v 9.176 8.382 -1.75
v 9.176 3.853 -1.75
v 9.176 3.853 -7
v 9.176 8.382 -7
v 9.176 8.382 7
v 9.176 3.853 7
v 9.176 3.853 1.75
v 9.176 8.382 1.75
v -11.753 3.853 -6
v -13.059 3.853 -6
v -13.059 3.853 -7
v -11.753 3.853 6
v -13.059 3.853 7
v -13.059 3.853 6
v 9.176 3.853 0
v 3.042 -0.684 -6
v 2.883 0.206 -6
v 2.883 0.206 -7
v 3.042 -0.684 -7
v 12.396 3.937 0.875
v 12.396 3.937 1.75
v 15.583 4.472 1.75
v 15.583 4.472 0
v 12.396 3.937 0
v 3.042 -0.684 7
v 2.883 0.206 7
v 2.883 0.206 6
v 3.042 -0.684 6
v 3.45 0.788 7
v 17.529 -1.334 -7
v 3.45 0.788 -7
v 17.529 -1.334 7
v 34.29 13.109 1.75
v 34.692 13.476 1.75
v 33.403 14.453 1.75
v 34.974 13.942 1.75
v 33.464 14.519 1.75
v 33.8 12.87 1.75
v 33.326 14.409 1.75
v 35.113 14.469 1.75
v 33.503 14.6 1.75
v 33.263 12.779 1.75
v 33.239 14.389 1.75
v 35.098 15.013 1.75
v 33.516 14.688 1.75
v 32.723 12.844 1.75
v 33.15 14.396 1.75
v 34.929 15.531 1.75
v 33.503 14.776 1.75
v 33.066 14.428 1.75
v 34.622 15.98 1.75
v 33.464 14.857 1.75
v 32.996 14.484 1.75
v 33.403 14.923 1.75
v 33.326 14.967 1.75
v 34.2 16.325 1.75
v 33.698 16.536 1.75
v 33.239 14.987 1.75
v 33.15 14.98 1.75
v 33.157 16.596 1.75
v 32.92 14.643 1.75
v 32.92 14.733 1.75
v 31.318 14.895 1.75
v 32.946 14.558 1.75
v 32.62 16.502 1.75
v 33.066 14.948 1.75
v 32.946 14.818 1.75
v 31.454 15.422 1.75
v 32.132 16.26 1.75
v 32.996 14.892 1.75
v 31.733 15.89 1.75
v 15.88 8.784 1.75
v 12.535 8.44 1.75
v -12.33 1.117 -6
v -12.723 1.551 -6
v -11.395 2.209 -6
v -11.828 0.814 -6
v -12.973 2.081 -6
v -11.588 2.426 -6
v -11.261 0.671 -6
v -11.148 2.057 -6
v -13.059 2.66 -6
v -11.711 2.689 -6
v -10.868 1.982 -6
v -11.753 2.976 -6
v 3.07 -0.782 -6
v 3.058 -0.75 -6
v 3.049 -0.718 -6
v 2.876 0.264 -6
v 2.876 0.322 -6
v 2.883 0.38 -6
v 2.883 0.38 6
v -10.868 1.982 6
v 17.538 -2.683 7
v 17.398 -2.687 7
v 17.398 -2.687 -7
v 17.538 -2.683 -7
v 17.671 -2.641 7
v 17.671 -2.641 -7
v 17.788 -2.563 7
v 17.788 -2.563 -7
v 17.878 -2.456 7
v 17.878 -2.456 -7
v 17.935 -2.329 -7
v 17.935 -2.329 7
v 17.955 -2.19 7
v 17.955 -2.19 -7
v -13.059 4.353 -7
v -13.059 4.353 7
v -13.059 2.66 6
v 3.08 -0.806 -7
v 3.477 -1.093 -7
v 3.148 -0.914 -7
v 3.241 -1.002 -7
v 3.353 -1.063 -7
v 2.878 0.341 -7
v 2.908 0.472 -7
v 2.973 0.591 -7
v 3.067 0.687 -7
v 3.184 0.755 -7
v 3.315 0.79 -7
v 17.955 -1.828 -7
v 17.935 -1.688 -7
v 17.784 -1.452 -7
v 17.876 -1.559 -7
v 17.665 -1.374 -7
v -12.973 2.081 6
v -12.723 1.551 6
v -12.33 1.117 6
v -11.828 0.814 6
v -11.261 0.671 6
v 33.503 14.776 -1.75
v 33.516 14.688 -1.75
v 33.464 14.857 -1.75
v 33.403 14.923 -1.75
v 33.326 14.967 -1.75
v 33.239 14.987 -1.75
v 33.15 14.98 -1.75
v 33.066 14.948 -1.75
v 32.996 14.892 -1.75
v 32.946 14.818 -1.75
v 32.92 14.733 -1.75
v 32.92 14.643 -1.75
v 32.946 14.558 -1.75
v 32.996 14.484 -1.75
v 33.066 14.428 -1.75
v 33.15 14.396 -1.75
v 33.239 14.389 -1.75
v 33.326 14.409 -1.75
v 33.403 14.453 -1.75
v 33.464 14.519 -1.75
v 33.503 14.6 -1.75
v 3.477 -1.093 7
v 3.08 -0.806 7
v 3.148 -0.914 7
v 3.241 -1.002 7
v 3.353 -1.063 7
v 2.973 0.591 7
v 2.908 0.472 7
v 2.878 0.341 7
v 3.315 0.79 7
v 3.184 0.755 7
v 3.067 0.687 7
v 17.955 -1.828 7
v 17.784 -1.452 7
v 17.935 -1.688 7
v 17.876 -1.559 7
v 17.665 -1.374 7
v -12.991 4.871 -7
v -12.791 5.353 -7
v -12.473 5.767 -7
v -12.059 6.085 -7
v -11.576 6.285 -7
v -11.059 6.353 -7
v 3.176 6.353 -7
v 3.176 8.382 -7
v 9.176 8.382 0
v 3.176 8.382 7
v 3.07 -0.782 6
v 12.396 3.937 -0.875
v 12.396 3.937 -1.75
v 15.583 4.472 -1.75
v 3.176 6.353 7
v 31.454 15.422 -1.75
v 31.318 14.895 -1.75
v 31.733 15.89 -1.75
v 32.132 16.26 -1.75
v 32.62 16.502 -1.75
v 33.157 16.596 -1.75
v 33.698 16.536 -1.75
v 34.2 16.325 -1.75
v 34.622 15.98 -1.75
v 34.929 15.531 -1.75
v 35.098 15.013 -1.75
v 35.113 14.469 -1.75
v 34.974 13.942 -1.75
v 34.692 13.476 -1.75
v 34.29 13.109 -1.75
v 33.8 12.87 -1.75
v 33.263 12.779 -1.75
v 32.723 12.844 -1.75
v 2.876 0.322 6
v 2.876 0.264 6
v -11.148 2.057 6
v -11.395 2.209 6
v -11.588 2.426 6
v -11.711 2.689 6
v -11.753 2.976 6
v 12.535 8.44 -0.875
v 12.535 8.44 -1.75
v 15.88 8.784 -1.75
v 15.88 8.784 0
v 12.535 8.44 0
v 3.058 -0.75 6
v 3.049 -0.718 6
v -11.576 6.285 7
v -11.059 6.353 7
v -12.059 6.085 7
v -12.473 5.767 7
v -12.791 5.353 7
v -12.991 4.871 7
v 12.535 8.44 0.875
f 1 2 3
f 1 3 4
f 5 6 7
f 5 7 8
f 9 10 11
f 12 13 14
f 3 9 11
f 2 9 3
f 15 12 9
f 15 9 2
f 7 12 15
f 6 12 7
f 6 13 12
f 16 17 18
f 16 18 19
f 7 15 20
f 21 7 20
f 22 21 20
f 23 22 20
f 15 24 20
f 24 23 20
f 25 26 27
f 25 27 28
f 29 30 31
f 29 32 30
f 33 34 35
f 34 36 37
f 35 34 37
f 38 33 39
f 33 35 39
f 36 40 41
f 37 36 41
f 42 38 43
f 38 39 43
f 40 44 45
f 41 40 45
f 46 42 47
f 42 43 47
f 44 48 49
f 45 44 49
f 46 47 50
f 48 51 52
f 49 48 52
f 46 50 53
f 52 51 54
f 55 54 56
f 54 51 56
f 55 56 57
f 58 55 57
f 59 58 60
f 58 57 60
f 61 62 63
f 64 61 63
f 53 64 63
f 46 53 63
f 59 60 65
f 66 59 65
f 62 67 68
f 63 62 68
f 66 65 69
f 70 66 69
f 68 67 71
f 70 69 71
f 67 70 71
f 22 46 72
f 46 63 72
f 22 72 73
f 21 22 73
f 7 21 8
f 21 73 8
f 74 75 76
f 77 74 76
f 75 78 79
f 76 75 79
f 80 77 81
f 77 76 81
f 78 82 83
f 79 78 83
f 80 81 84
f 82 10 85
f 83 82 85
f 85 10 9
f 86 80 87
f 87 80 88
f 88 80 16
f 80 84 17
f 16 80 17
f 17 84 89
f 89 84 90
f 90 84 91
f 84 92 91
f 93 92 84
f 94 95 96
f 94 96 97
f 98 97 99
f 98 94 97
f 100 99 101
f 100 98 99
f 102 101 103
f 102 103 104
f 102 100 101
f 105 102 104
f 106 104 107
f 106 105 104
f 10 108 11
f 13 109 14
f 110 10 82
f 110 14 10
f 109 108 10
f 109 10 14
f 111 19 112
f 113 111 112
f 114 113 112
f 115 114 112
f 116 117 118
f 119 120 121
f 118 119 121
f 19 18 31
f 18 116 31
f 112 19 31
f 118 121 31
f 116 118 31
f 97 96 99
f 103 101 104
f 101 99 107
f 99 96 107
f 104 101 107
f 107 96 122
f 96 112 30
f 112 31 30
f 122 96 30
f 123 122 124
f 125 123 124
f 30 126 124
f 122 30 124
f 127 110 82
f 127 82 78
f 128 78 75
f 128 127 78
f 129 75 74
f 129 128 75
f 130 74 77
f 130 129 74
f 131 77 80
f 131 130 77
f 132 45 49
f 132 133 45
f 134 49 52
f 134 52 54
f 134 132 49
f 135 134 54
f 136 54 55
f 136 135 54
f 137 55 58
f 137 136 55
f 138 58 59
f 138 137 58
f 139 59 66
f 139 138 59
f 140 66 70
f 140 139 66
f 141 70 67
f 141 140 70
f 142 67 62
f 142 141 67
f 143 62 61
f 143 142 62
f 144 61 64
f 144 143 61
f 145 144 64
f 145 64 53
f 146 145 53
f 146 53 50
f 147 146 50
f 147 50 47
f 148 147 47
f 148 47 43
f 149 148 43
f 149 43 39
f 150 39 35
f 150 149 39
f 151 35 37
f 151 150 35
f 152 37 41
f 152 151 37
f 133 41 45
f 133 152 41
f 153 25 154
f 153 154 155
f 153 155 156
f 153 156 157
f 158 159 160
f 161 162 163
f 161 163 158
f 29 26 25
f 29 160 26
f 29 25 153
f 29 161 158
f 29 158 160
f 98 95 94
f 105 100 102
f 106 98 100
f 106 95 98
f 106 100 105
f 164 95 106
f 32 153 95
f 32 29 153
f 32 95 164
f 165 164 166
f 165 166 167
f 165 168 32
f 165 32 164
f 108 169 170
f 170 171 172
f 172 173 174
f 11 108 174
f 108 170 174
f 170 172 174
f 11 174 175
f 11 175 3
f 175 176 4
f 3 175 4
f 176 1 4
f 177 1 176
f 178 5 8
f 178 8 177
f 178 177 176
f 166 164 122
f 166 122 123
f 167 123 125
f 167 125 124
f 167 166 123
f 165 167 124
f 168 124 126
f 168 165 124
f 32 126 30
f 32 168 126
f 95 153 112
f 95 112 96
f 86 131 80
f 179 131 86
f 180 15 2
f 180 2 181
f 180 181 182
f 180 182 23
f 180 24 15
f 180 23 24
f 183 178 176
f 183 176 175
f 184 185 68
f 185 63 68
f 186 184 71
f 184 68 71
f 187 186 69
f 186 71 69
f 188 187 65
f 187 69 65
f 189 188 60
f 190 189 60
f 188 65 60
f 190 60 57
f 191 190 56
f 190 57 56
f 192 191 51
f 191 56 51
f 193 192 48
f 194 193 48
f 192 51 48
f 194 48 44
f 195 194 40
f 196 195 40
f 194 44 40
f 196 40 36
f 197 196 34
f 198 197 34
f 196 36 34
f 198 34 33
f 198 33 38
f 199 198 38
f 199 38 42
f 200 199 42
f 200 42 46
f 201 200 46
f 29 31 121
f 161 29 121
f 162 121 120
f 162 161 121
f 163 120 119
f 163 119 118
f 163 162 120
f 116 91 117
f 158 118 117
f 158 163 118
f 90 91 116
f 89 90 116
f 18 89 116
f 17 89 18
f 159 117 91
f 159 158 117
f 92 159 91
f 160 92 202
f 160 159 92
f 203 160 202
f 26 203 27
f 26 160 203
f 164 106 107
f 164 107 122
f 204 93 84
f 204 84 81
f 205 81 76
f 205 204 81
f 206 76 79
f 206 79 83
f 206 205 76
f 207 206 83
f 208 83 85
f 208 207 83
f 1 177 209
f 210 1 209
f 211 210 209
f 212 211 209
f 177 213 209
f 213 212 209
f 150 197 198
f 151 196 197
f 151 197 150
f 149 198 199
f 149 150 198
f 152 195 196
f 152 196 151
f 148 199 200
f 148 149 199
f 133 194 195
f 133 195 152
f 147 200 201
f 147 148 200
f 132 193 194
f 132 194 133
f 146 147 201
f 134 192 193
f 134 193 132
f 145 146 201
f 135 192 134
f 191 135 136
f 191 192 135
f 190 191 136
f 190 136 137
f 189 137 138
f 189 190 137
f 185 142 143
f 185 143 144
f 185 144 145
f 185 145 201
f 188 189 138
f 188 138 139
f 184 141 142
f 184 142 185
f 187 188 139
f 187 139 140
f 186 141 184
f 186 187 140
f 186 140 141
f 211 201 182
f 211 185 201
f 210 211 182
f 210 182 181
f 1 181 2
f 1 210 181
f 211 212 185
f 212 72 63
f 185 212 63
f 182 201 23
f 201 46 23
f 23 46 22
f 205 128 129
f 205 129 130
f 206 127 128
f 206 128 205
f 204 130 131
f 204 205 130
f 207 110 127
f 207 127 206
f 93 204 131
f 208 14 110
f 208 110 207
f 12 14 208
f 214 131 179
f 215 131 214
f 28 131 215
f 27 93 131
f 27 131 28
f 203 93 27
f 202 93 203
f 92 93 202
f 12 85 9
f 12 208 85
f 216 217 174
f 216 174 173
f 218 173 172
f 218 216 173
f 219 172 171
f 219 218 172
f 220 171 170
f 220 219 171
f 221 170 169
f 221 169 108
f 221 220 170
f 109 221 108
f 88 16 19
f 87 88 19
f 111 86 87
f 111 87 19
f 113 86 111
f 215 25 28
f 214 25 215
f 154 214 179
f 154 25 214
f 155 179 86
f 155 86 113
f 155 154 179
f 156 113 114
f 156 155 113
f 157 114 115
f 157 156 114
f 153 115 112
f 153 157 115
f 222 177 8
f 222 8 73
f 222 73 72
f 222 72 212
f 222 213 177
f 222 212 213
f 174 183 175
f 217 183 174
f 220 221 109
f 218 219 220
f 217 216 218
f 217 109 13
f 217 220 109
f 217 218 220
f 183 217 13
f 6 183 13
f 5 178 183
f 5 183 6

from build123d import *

# Parameters (mm, degrees)
BOSS_EXTRUDE1_DEPTH = 7
BOSS_EXTRUDE2_DEPTH = 6
BOSS_EXTRUDE3_DEPTH = 7
SKETCH4_R           = 0.3
BOSS_EXTRUDE4_DEPTH = 1.75


with BuildPart() as part:
    # Sketch1 → Boss-Extrude1 (new, symmetric)
    with BuildSketch(Plane.XY):
        with BuildLine():
            Line((9.176470588, 3.852941176), (9.176470588, 8.382352941))
            Line((9.176470588, 8.382352941), (3.176470588, 8.382352941))
            Line((3.176470588, 8.382352941), (3.176470588, 6.352941176))
            Line((3.176470588, 6.352941176), (-11.058823529, 6.352941176))
            ThreePointArc((-11.058823529, 6.352941176), (-12.473037092, 5.767154739), (-13.058823529, 4.352941176))
            Line((-13.058823529, 4.352941176), (-13.058823529, 3.852941176))
            Line((-13.058823529, 3.852941176), (9.176470588, 3.852941176))
        make_face()
    extrude(amount=BOSS_EXTRUDE1_DEPTH, both=True)

    # Sketch2 → Boss-Extrude2 (add, symmetric)
    with BuildSketch(Plane.XY):
        with BuildLine():
            Line((-13.058823529, 3.852941176), (-13.058823529, 2.660454677))
            ThreePointArc((-13.058823529, 2.660454677), (-12.542636873, 1.319448352), (-11.260525567, 0.670651599))
            Line((-11.260525567, 0.670651599), (3.072810241, -0.782287673))
            Line((3.072810241, -0.782287673), (3.072810241, 0.357643739))
            Line((3.072810241, 0.357643739), (-10.868321542, 1.982265031))
            ThreePointArc((-10.868321542, 1.982265031), (-11.499481128, 2.310618881), (-11.752570466, 2.975543285))
            Line((-11.752570466, 2.975543285), (-11.752570466, 3.852941176))
            Line((-11.752570466, 3.852941176), (-13.058823529, 3.852941176))
        make_face()
    extrude(amount=BOSS_EXTRUDE2_DEPTH, both=True)

    # Sketch3 → Boss-Extrude3 (add, symmetric)
    with BuildSketch(Plane.XY):
        with BuildLine():
            Line((2.883131421, 0.205607724), (3.042051607, -0.684345316))
            ThreePointArc((3.042051607, -0.684345316), (3.191971306, -0.960915025), (3.477393899, -1.0932051))
            Line((3.477393899, -1.0932051), (17.397932492, -2.686911621))
            ThreePointArc((17.397932492, -2.686911621), (17.787643477, -2.563275633), (17.954803987, -2.190156518))
            Line((17.954803987, -2.190156518), (17.954803987, -1.828059238))
            ThreePointArc((17.954803987, -1.828059238), (17.833783341, -1.50190797), (17.529305388, -1.333640851))
            Line((17.529305388, -1.333640851), (3.449846609, 0.78792143))
            ThreePointArc((3.449846609, 0.78792143), (3.017025208, 0.642224676), (2.883131421, 0.205607724))
        make_face()
    extrude(amount=BOSS_EXTRUDE3_DEPTH, both=True)

    # Sketch4 → Boss-Extrude4 (add, symmetric)
    with BuildSketch(Plane.XY):
        with BuildLine():
            Line((15.880495921, 8.784024701), (31.318309496, 14.894554405))
            ThreePointArc((31.318309496, 14.894554405), (34.7916946, 15.766688386), (32.722657859, 12.843657643))
            Line((32.722657859, 12.843657643), (15.583027287, 4.472426378))
            add(Edge.make_bspline(
                [(9.176470588, 3.852941176), (12.411471434, 3.711455216), (15.583027287, 4.472426378)],
                knots=[0, 0, 0, 1, 1, 1], degree=2))
            Line((9.176470588, 3.852941176), (9.176470588, 8.382352941))
            add(Edge.make_bspline(
                [(9.176470588, 8.382352941), (12.540784879, 8.295907329), (15.880495921, 8.784024701)],
                knots=[0, 0, 0, 1, 1, 1], degree=2))
        make_face()
        with Locations((33.216362624, 14.687982269)):
            Circle(SKETCH4_R, mode=Mode.SUBTRACT)
    extrude(amount=BOSS_EXTRUDE4_DEPTH, both=True)


solid = part.part
